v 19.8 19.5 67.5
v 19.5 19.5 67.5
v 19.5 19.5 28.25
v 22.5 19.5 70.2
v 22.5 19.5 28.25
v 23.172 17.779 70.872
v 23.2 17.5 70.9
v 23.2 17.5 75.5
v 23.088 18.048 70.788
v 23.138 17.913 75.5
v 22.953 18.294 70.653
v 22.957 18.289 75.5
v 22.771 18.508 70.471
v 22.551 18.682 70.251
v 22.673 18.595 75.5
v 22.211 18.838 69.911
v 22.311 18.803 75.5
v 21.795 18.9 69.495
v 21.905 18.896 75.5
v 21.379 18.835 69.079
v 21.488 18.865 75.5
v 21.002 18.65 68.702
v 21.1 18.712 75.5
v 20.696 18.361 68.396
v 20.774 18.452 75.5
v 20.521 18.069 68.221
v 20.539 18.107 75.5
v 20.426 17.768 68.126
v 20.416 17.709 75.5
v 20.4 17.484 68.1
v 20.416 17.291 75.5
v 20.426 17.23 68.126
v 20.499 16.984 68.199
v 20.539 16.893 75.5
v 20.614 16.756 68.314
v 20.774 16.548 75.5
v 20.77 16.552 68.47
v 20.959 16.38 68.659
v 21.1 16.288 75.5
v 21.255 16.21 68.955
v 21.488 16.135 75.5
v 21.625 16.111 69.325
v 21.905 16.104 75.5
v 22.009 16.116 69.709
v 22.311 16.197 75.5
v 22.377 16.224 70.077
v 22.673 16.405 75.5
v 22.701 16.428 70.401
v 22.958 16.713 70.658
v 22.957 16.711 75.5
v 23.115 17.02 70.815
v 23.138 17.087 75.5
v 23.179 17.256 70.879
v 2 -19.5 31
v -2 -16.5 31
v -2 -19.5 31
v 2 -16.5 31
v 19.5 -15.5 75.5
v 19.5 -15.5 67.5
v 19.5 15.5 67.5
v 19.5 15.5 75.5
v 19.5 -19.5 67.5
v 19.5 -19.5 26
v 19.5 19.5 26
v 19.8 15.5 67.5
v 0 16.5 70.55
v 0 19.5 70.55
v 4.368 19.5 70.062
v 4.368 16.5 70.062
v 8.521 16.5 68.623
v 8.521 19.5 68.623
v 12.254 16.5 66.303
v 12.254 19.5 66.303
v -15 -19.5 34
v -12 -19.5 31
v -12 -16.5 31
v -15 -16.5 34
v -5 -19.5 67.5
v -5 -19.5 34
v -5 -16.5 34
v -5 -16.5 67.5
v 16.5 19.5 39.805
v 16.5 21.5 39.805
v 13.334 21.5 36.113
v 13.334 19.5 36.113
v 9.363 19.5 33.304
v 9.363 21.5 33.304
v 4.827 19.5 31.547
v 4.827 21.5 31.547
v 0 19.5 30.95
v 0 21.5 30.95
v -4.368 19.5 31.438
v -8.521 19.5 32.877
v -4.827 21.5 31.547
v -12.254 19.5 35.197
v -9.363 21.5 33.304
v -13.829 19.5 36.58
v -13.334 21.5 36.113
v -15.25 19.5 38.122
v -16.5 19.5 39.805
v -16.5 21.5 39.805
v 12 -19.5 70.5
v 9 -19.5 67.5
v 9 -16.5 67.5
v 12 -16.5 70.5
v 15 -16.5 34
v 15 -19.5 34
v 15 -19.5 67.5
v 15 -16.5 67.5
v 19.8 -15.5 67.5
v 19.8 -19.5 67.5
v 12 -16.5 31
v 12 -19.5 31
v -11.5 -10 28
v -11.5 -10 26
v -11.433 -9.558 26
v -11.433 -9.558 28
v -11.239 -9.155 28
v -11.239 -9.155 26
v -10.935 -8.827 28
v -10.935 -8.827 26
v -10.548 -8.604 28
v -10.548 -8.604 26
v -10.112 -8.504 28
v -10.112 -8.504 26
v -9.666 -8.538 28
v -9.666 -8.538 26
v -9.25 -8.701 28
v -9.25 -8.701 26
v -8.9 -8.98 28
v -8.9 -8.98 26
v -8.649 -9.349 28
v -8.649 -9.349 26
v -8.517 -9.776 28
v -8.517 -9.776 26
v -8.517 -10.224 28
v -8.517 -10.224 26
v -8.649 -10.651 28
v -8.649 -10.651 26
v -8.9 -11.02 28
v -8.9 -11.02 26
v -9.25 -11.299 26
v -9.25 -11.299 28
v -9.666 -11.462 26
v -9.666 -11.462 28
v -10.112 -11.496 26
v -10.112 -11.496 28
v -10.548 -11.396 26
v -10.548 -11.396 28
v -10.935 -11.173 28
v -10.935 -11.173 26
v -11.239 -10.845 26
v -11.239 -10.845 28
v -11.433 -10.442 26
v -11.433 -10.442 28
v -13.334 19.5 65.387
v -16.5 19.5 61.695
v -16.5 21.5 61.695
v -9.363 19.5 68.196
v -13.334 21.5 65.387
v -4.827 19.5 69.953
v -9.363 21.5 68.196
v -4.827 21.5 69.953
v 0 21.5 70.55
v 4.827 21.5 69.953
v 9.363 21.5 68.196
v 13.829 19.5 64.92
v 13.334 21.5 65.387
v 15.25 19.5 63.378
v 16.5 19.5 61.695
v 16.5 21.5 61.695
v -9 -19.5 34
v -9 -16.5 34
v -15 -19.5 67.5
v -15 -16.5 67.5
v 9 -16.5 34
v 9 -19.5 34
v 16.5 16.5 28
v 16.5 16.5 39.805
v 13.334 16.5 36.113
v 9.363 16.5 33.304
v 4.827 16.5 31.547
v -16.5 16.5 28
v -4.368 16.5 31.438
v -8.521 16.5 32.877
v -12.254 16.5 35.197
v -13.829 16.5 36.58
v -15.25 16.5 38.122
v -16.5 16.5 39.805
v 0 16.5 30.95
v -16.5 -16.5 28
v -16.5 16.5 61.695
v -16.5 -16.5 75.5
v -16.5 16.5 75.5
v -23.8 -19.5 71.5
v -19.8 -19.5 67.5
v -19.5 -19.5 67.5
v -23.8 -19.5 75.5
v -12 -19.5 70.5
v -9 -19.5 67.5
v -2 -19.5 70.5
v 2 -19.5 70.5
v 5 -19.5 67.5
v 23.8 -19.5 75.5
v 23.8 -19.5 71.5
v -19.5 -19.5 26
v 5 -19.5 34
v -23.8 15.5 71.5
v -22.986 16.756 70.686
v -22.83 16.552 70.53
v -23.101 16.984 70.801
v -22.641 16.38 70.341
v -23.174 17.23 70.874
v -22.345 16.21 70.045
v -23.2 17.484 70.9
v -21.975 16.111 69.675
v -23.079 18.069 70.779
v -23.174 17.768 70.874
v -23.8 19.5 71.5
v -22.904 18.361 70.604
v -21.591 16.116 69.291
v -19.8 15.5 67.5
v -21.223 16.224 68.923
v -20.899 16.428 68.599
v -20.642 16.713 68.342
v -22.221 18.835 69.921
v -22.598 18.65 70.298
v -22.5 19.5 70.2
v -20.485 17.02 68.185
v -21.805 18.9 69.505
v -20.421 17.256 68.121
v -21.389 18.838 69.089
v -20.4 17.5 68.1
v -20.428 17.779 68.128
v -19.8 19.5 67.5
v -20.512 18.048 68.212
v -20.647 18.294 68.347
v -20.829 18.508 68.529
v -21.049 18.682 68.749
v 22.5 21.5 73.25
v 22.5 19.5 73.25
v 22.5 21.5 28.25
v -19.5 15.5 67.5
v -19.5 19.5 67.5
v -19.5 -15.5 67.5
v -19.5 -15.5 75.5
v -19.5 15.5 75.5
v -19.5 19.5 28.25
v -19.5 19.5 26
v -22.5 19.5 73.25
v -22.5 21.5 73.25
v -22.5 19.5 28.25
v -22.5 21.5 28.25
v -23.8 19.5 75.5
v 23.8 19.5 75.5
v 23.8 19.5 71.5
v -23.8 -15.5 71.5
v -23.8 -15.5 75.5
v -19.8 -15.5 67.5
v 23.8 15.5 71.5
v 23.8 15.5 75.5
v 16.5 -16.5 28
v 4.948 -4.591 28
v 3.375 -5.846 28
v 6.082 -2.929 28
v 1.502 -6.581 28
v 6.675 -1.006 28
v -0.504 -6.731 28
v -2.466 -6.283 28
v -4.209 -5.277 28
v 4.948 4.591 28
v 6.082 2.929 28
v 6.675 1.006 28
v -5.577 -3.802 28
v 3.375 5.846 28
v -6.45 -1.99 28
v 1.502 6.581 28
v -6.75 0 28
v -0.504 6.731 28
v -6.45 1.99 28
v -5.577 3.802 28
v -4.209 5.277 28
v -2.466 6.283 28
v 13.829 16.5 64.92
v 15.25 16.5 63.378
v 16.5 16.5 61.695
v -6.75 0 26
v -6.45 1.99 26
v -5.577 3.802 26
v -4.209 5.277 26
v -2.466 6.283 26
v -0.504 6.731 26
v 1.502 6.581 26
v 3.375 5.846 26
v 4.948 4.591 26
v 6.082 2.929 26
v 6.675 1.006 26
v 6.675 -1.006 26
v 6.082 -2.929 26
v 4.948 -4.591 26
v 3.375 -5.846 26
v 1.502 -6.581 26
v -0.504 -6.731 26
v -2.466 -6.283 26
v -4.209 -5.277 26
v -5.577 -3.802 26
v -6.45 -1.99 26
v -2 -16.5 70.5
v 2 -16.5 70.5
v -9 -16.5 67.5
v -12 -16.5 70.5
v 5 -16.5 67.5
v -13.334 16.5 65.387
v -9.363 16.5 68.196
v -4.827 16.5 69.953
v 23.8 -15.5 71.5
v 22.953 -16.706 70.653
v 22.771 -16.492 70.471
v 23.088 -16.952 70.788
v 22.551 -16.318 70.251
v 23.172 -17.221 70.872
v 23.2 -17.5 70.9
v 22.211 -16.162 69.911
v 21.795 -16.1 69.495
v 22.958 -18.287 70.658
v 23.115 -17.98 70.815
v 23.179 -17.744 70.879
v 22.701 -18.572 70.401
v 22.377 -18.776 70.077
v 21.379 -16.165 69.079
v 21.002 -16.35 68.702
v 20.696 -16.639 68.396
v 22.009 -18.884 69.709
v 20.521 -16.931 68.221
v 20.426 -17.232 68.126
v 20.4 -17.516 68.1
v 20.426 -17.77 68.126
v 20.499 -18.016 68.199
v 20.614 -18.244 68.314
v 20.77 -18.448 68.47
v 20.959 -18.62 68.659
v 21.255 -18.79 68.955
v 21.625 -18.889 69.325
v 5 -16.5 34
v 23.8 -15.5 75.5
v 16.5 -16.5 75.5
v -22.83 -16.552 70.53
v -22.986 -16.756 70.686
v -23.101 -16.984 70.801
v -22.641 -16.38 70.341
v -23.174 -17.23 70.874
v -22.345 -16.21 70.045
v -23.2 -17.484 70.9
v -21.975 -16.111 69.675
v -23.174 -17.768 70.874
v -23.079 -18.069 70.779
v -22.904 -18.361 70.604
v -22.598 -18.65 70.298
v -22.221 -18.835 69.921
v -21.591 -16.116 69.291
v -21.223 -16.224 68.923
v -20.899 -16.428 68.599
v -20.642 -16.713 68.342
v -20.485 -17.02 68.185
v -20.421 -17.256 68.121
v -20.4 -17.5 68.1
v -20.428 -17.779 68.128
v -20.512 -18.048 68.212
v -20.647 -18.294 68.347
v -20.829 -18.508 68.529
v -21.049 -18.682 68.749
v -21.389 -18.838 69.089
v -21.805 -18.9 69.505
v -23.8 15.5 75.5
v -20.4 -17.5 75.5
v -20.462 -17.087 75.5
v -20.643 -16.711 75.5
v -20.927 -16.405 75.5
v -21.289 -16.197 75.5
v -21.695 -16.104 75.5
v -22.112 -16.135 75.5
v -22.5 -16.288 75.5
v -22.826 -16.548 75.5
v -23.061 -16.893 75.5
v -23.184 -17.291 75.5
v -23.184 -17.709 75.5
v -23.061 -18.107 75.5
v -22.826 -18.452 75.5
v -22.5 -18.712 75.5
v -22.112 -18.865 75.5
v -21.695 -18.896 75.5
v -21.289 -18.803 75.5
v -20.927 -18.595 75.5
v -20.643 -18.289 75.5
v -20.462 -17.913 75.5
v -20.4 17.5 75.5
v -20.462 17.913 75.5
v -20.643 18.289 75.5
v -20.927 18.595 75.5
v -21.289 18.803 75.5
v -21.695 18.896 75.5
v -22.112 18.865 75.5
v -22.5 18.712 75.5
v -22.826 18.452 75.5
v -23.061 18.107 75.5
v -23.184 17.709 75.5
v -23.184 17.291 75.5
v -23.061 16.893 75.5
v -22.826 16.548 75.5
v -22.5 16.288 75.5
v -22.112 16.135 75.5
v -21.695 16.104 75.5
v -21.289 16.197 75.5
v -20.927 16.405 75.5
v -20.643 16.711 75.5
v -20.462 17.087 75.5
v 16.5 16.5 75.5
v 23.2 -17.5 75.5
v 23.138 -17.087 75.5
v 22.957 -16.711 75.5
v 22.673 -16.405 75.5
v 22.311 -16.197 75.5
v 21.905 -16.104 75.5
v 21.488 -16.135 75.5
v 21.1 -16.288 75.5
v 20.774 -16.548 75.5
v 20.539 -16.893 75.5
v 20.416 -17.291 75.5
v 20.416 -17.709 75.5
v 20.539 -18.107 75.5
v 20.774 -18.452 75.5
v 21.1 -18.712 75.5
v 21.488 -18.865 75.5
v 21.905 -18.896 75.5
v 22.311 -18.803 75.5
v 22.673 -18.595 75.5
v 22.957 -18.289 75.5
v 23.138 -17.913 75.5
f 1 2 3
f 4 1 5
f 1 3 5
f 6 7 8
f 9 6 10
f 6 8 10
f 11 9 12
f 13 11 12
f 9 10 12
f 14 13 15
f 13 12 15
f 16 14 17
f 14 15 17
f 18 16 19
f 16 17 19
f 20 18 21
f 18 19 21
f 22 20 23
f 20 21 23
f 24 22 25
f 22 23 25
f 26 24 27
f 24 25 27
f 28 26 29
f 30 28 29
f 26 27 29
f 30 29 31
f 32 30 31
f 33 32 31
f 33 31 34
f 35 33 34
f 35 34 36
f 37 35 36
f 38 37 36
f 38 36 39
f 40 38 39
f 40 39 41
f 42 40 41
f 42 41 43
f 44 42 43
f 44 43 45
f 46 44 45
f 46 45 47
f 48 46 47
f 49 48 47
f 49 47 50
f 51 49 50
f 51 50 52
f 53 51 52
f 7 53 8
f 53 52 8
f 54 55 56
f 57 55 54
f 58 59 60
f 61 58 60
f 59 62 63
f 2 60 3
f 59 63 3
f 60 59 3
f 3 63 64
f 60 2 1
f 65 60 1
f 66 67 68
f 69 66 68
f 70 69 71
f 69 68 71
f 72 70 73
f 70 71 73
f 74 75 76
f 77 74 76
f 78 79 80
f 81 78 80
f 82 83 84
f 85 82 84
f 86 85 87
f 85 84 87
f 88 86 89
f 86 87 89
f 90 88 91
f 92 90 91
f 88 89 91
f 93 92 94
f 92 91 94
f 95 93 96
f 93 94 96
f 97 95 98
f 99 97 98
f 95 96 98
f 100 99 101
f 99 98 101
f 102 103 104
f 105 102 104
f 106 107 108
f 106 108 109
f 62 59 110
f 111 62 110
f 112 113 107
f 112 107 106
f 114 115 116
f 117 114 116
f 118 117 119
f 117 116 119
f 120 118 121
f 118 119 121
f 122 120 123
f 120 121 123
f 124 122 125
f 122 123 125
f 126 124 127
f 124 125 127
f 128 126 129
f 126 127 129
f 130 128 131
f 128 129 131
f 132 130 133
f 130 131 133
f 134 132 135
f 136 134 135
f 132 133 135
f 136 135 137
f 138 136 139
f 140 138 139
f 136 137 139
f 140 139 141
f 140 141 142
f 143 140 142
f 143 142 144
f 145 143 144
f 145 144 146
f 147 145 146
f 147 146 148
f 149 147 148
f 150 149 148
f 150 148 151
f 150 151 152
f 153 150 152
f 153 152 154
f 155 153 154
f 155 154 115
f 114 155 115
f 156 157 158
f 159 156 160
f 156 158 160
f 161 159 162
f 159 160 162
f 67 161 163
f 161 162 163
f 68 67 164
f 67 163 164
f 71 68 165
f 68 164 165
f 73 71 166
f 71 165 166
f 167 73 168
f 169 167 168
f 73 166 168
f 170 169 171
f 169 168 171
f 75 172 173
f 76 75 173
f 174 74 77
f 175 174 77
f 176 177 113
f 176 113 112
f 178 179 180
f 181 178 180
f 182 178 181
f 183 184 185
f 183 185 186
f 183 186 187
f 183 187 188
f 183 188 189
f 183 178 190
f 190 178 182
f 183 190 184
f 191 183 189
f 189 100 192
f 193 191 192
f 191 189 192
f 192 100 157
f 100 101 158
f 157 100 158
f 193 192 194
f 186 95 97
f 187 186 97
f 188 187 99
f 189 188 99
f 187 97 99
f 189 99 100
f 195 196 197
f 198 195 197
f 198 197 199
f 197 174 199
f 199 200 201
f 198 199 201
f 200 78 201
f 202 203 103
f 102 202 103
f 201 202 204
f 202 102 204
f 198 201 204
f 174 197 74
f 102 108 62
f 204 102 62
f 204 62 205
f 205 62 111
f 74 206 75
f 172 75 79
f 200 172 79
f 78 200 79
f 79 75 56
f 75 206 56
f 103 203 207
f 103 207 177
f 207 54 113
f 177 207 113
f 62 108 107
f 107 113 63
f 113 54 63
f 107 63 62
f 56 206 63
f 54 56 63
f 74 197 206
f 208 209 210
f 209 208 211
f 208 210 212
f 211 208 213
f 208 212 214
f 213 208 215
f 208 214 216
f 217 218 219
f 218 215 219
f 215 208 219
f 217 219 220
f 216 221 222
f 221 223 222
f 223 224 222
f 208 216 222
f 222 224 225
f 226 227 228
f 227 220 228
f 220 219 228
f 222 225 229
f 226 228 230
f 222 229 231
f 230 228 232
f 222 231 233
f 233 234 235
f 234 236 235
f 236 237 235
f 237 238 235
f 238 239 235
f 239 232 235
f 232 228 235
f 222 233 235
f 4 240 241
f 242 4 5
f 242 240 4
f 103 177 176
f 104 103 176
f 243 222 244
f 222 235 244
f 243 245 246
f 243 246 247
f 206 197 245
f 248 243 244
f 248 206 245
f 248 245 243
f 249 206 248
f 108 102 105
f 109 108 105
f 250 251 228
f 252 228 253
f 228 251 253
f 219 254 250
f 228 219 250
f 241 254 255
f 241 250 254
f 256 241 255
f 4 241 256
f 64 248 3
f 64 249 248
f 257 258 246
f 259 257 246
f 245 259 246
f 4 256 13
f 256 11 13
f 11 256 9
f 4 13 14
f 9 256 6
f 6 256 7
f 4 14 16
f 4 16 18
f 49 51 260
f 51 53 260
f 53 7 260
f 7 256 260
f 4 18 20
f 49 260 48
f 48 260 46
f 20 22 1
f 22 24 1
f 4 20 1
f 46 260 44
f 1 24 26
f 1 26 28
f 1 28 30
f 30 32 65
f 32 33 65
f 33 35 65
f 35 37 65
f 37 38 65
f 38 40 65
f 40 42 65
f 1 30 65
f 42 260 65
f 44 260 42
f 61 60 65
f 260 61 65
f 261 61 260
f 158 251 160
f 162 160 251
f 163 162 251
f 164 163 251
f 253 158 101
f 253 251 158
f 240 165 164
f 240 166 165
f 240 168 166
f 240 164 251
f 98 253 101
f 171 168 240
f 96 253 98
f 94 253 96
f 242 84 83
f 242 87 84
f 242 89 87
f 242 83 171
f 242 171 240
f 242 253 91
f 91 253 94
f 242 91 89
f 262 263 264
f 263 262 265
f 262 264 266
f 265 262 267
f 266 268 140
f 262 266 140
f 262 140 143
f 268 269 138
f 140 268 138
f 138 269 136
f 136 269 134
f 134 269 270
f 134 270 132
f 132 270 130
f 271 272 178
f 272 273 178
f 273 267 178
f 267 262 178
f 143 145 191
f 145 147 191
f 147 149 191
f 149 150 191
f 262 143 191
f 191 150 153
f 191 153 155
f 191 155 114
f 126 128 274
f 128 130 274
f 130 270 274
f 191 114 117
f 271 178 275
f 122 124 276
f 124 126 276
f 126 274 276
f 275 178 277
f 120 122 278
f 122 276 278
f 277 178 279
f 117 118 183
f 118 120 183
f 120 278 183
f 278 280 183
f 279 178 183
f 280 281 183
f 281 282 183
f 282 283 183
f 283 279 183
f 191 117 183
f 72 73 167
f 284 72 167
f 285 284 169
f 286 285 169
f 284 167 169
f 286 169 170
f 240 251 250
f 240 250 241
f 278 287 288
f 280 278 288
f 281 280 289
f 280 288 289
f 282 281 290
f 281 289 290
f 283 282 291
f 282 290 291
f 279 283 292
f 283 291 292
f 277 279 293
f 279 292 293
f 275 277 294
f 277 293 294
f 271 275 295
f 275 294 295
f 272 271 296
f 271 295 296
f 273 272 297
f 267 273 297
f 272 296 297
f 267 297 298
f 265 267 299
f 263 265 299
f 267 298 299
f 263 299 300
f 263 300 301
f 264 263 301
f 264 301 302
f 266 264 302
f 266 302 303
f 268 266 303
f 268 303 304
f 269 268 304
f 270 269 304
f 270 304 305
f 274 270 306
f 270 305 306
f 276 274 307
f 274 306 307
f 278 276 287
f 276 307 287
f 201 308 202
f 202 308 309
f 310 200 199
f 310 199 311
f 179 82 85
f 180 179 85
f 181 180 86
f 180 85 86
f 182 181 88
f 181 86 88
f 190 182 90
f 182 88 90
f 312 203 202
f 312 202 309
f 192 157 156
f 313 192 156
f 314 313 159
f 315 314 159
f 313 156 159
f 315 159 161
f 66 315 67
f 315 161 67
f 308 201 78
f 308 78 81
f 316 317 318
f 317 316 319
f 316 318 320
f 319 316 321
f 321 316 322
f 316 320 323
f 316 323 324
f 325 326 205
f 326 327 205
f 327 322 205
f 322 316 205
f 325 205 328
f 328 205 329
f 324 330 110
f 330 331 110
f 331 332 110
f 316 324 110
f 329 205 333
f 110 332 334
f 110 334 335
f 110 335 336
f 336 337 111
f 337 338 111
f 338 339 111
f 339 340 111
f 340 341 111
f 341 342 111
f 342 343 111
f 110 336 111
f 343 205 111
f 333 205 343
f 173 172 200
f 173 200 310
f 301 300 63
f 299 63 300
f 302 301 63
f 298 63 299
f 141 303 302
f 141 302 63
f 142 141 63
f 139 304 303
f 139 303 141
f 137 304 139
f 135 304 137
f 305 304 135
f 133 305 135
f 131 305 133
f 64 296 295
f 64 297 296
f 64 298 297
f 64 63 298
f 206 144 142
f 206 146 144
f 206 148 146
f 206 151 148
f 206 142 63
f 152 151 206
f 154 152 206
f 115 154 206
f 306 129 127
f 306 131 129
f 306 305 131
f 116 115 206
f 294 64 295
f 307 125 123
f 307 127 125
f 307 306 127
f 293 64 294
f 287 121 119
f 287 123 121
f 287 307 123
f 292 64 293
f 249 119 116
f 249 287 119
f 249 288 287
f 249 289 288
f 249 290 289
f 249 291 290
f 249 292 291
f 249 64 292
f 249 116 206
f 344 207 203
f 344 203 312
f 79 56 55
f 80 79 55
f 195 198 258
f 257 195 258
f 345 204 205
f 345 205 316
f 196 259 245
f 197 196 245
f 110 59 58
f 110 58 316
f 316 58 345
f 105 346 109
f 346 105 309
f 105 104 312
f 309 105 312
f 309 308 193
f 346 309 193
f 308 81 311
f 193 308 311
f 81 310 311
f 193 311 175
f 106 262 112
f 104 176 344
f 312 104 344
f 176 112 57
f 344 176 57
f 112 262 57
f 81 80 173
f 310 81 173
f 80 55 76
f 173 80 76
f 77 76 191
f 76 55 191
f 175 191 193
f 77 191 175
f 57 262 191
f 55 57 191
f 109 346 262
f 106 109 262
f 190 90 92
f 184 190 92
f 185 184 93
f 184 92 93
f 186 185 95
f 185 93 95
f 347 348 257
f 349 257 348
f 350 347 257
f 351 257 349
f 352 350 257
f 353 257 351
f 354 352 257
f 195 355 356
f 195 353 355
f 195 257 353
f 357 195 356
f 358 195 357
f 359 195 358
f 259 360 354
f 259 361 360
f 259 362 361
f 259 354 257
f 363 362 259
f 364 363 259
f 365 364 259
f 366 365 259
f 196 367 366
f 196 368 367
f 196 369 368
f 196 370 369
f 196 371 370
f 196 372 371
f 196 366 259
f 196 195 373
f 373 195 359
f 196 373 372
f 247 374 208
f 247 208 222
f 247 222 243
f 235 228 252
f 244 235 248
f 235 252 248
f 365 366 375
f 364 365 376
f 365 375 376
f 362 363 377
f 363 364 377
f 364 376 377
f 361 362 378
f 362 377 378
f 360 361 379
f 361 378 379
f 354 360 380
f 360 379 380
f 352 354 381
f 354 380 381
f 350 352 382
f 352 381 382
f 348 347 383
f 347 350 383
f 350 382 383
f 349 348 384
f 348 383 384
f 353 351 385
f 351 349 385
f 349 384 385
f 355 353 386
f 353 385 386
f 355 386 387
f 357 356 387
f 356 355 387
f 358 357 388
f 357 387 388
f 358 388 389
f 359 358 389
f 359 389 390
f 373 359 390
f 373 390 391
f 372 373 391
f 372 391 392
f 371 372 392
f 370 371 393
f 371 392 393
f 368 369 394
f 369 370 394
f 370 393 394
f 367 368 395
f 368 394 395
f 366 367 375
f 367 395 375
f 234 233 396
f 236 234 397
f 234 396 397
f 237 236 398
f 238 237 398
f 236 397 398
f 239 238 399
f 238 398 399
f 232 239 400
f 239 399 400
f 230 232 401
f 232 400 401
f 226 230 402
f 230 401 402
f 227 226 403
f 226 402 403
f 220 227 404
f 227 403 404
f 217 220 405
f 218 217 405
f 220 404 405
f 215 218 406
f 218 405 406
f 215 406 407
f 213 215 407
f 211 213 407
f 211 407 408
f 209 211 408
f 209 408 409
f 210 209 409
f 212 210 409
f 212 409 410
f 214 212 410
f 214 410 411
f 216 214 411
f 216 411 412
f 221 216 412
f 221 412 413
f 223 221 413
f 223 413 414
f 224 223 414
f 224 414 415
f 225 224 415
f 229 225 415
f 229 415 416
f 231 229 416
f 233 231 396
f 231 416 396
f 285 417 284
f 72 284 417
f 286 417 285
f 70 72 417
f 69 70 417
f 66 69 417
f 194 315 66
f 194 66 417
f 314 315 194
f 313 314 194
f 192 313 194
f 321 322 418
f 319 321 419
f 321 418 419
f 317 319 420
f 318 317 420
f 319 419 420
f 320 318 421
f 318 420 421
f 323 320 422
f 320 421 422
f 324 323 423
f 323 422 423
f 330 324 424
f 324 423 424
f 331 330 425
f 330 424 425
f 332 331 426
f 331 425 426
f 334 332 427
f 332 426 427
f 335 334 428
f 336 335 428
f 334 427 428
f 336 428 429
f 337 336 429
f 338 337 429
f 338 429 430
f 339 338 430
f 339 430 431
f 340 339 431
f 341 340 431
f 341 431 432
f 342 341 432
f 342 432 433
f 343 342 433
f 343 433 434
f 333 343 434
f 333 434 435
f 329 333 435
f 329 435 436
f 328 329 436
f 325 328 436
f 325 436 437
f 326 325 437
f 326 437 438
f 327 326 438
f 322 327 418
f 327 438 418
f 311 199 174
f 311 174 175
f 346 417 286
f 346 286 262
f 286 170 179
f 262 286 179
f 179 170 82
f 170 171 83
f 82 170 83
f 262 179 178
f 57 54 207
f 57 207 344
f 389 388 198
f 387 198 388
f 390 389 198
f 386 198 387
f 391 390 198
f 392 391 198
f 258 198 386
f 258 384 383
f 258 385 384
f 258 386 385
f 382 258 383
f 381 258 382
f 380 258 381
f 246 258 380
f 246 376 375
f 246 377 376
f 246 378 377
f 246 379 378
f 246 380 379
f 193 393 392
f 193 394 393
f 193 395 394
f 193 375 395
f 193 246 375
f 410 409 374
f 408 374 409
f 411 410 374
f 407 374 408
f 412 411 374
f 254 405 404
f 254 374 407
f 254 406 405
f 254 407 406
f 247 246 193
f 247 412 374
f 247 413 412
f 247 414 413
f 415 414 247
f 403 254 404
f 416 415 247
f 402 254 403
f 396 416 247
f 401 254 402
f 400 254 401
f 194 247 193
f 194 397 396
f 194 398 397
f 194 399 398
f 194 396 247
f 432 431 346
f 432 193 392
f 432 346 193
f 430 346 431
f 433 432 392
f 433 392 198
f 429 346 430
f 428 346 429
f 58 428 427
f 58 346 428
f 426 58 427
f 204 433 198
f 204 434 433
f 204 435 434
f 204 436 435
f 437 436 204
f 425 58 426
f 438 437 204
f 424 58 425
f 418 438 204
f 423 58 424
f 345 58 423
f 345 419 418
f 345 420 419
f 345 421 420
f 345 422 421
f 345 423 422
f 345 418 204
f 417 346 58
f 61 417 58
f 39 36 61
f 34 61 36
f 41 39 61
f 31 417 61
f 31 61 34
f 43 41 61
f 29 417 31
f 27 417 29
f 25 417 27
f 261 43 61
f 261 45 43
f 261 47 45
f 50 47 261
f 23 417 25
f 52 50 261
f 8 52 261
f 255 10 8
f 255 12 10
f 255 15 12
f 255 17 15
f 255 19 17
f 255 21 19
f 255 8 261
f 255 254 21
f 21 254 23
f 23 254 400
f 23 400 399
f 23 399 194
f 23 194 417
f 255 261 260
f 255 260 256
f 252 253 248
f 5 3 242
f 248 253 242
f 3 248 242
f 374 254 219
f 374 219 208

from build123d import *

# Parameters (mm, degrees)
CROQUIS1_W               = 39
CROQUIS1_H               = 39
SALIENTE_EXTRUIR2_DEPTH  = 75.5
CROQUIS2_W               = 33
CROQUIS2_H               = 33
CORTAR_EXTRUIR1_DEPTH    = 80
CROQUIS11_W              = 33
CROQUIS11_H              = 33
SALIENTE_EXTRUIR3_DEPTH  = 37
CROQUIS13_W              = 33
CROQUIS13_H              = 33
CORTAR_EXTRUIR6_DEPTH    = 81.378790735
CROQUIS16_W              = 39
CROQUIS16_H              = 39
CORTAR_EXTRUIR8_DEPTH    = 10
CROQUIS19_W              = 20
CROQUIS19_H              = 20
SALIENTE_EXTRUIR4_DEPTH  = 3
CROQUIS33_W              = 39
CROQUIS33_H              = 39
SALIENTE_EXTRUIR7_DEPTH  = 18
CROQUIS35_W              = 39
CROQUIS35_H              = 39
CORTAR_EXTRUIR17_DEPTH   = 16
CROQUIS36_R              = 6.75
CORTAR_EXTRUIR18_DEPTH   = 2
CORTAR_EXTRUIR19_REACH   = 89.187
SALIENTE_EXTRUIR10_START = 2
CROQUIS38_W              = 45
CROQUIS38_H              = 45
SALIENTE_EXTRUIR10_DEPTH = 2
CROQUIS39_W              = 7.3
CROQUIS39_H              = 4
SALIENTE_EXTRUIR12_DEPTH = 8
RESPIRADERO1_START       = 31
RESPIRADERO1_OUTLINE_W   = 6
RESPIRADERO1_OUTLINE_H   = 3
RESPIRADERO1_OUTLINE_W_2 = 10
RESPIRADERO1_DEPTH       = 39.5
CHAFL_N7_SIZE            = 3
CROQUIS40_R              = 1.4
CORTAR_EXTRUIR20_DEPTH   = 10
CHAFL_N8_SIZE            = 4
CORTAR_EXTRUIR21_REACH   = 60.983
CROQUIS43_R              = 1.5


# Read off the part's stored shape, not the designer's step: Respiradero1
# Some blends are built 0.0001 mm under size
with BuildPart() as part:
    # Croquis1 → Saliente-Extruir2 (new body)
    with BuildSketch(Plane.XY):
        Rectangle(CROQUIS1_W, CROQUIS1_H)
    extrude(amount=SALIENTE_EXTRUIR2_DEPTH)

    # Croquis2 → Cortar-Extruir1 (cut)
    with BuildSketch(Plane.XY.offset(75.5)):
        Rectangle(CROQUIS2_W, CROQUIS2_H)
    extrude(amount=-CORTAR_EXTRUIR1_DEPTH, mode=Mode.SUBTRACT)

    # Croquis11 → Saliente-Extruir3 (add)
    with BuildSketch(Plane(origin=(0, 0, 0), x_dir=(-1, 0, 0), z_dir=(0, 0, -1))):
        Rectangle(CROQUIS11_W, CROQUIS11_H)
    extrude(amount=-SALIENTE_EXTRUIR3_DEPTH)

    # Croquis13 → Cortar-Extruir6 (cut, through all)
    with BuildSketch(Plane(origin=(0, 0, 0), x_dir=(-1, 0, 0), z_dir=(0, 0, -1))):
        Rectangle(CROQUIS13_W, CROQUIS13_H)
    extrude(amount=-CORTAR_EXTRUIR6_DEPTH, mode=Mode.SUBTRACT)

    # Croquis16 → Cortar-Extruir8 (cut)
    with BuildSketch(Plane(origin=(0, 0, 0), x_dir=(-1, 0, 0), z_dir=(0, 0, -1))):
        Rectangle(CROQUIS16_W, CROQUIS16_H)
    extrude(amount=-CORTAR_EXTRUIR8_DEPTH, mode=Mode.SUBTRACT)

    # Croquis19 → Saliente-Extruir4 (add)
    with BuildSketch(Plane(origin=(0, 19.5, 0), x_dir=(1, 0, 0), z_dir=(0, 1, 0))):
        with Locations((-2, -55.5)):
            Rectangle(CROQUIS19_W, CROQUIS19_H)
    extrude(amount=-SALIENTE_EXTRUIR4_DEPTH)

    # Croquis33 → Saliente-Extruir7 (add)
    with BuildSketch(Plane(origin=(0, 0, 10), x_dir=(-1, 0, 0), z_dir=(0, 0, -1))):
        Rectangle(CROQUIS33_W, CROQUIS33_H)
    extrude(amount=-SALIENTE_EXTRUIR7_DEPTH)

    # Croquis35 → Cortar-Extruir17 (cut)
    with BuildSketch(Plane(origin=(0, 0, 10), x_dir=(-1, 0, 0), z_dir=(0, 0, -1))):
        Rectangle(CROQUIS35_W, CROQUIS35_H)
    extrude(amount=-CORTAR_EXTRUIR17_DEPTH, mode=Mode.SUBTRACT)

    # Croquis36 → Cortar-Extruir18 (cut)
    with BuildSketch(Plane(origin=(0, 0, 26), x_dir=(-1, 0, 0), z_dir=(0, 0, -1))):
        Circle(CROQUIS36_R)
    extrude(amount=-CORTAR_EXTRUIR18_DEPTH, mode=Mode.SUBTRACT)

    # Croquis37 → Cortar-Extruir19 (cut, up to next)
    with BuildSketch(Plane(origin=(0, 19.5, 0), x_dir=(1, 0, 0), z_dir=(0, 1, 0)), mode=Mode.PRIVATE) as cortar_extruir19_sk1:
        with BuildLine():
            ThreePointArc((-5.8e-08, -30.95), (-6.484436966, -32.041924812), (-12.253670087, -35.19726489))
            Line((-12.253670087, -35.19726489), (12.253670087, -66.30273511))
            ThreePointArc((12.253670087, -66.30273511), (14.560271631, -64.167842228), (16.5, -61.694861808))
            Line((16.5, -61.694861808), (16.5, -39.805138192))
            ThreePointArc((16.5, -39.805138192), (9.363005266, -33.303678543), (-5.8e-08, -30.95))
        make_face()
    cortar_extruir19_tool1 = extrude(cortar_extruir19_sk1.sketch, amount=-CORTAR_EXTRUIR19_REACH, mode=Mode.PRIVATE) & part.part
    # Croquis37 → Cortar-Extruir19 (cut, up to next)
    with BuildSketch(Plane(origin=(0, 19.5, 0), x_dir=(1, 0, 0), z_dir=(0, 1, 0)), mode=Mode.PRIVATE) as cortar_extruir19_sk2:
        with BuildLine():
            Line((12.253670087, -66.30273511), (-12.253670087, -35.19726489))
            ThreePointArc((-12.253670087, -35.19726489), (-14.560271631, -37.332157772), (-16.5, -39.805138192))
            Line((-16.5, -39.805138192), (-16.5, -61.694861808))
            ThreePointArc((-16.5, -61.694861808), (-9.363005292, -68.196321443), (0, -70.55))
            ThreePointArc((0, -70.55), (6.484436939, -69.458075197), (12.253670087, -66.30273511))
        make_face()
    cortar_extruir19_tool2 = extrude(cortar_extruir19_sk2.sketch, amount=-CORTAR_EXTRUIR19_REACH, mode=Mode.PRIVATE) & part.part
    add(cortar_extruir19_tool1.solids().sort_by_distance((5.629579, 19.5, 45.099579))[0], mode=Mode.SUBTRACT)
    add(cortar_extruir19_tool2.solids().sort_by_distance((-5.629579, 19.5, 56.400421))[0], mode=Mode.SUBTRACT)

    # Croquis38 → Saliente-Extruir10 (add)
    with BuildSketch(Plane(origin=(0, 19.5, 0), x_dir=(1, 0, 0), z_dir=(0, 1, 0)).offset(SALIENTE_EXTRUIR10_START)):
        with Locations((0, -50.75)):
            Rectangle(CROQUIS38_W, CROQUIS38_H)
        with BuildLine():
            Line((-16.5, -39.805138192), (-16.5, -61.694861808))
            ThreePointArc((-16.5, -61.694861808), (0, -70.55), (16.5, -61.694861808))
            Line((16.5, -61.694861808), (16.5, -39.805138192))
            ThreePointArc((16.5, -39.805138192), (0, -30.95), (-16.5, -39.805138192))
        make_face(mode=Mode.SUBTRACT)
    extrude(amount=-SALIENTE_EXTRUIR10_DEPTH)

    # Croquis39 → Saliente-Extruir12 (add)
    with BuildSketch(Plane.XY.offset(75.5)):
        Polygon((-16.5, 16.5), (-16.5, 19.5), (-23.8, 19.5), (-23.8, 15.5), (-16.5, 15.5), align=None)
        with Locations((-20.15, -17.5)):
            Rectangle(CROQUIS39_W, CROQUIS39_H)
        with Locations((20.15, -17.5)):
            Rectangle(CROQUIS39_W, CROQUIS39_H)
        with Locations((20.15, 17.5)):
            Rectangle(CROQUIS39_W, CROQUIS39_H)
    extrude(amount=-SALIENTE_EXTRUIR12_DEPTH)

    # Respiradero1 outline → Respiradero1 (cut)
    with BuildSketch(Plane.XY.offset(RESPIRADERO1_START)):
        with Locations((-12, -18)):
            Rectangle(RESPIRADERO1_OUTLINE_W, RESPIRADERO1_OUTLINE_H)
        with Locations((0, -18)):
            Rectangle(RESPIRADERO1_OUTLINE_W_2, RESPIRADERO1_OUTLINE_H)
        with Locations((12, -18)):
            Rectangle(RESPIRADERO1_OUTLINE_W, RESPIRADERO1_OUTLINE_H)
    extrude(amount=RESPIRADERO1_DEPTH, mode=Mode.SUBTRACT)

    # Chaflán7
    chafl_n7_edges = [part.edges().sort_by_distance(p)[0] for p in [
        (15, -18, 70.5),
        (-15, -18, 70.5),
        (-15, -18, 31),
        (15, -18, 31),
        (5, -18, 31),
        (5, -18, 70.5),
        (9, -18, 70.5),
        (9, -18, 31),
        (-5, -18, 70.5),
        (-5, -18, 31),
        (-9, -18, 31),
        (-9, -18, 70.5),
    ]]
    chamfer(chafl_n7_edges, length=CHAFL_N7_SIZE - 0.0001)  # a hair under: the kernel refuses the full size

    # Croquis40 → Cortar-Extruir20 (cut)
    with BuildSketch(Plane.XY.offset(75.5)):
        with Locations((-21.8, 17.5)):
            Circle(CROQUIS40_R)
        with Locations((21.8, 17.5)):
            Circle(CROQUIS40_R)
        with Locations((21.8, -17.5)):
            Circle(CROQUIS40_R)
        with Locations((-21.8, -17.5)):
            Circle(CROQUIS40_R)
    extrude(amount=-CORTAR_EXTRUIR20_DEPTH, mode=Mode.SUBTRACT)

    # Chaflán8
    # the kernel refuses this chamfer: 4 mm, written as the material it takes off along each edge
    with BuildSketch(Plane(origin=(-23.8, 19.5, 67.5), x_dir=(-0.02749587661058651, 0, 0.9996219169112968), z_dir=(0, -1, 0)), Plane(origin=(23.8, 5.213268048, 67.5), x_dir=(0.02749587661058651, 0, 0.9996219169112968), z_dir=(0, 1, 0))) as chafl_n8_piece_1:
        Polygon((CHAFL_N8_SIZE * 0.999621916911, -CHAFL_N8_SIZE * 0.0274958766106), (-CHAFL_N8_SIZE * 0.0274958766106, -CHAFL_N8_SIZE * 0.999621916911), (0, 0), align=None)
    extrude(amount=14.286731952, mode=Mode.SUBTRACT)
    with BuildSketch(Plane(origin=(-23.8, -29.786731952, 67.5), x_dir=(-0.02749587661058651, 0, 0.9996219169112968), z_dir=(0, 1, 0))) as chafl_n8_piece_2:
        Polygon((CHAFL_N8_SIZE * 0.999621916911, CHAFL_N8_SIZE * 0.0274958766106), (-CHAFL_N8_SIZE * 0.0274958766106, CHAFL_N8_SIZE * 0.999621916911), (0, 0), align=None)
    extrude(amount=24.573463904, mode=Mode.SUBTRACT)
    with BuildSketch(Plane(origin=(23.8, -29.786731952, 67.5), x_dir=(0.02749587661058651, 0, 0.9996219169112968), z_dir=(0, 1, 0))) as chafl_n8_piece_3:
        Polygon((CHAFL_N8_SIZE * 0.999621916911, -CHAFL_N8_SIZE * 0.0274958766106), (-CHAFL_N8_SIZE * 0.0274958766106, -CHAFL_N8_SIZE * 0.999621916911), (0, 0), align=None)
    extrude(amount=24.573463904, mode=Mode.SUBTRACT)

    # Croquis43 → Cortar-Extruir21 (cut, up to next)
    with BuildSketch(Plane(origin=(0, 0, 26), x_dir=(-1, 0, 0), z_dir=(0, 0, -1)), mode=Mode.PRIVATE) as cortar_extruir21_sk1:
        with Locations((10, -10)):
            Circle(CROQUIS43_R)
    cortar_extruir21_tool1 = extrude(cortar_extruir21_sk1.sketch, amount=-CORTAR_EXTRUIR21_REACH, mode=Mode.PRIVATE) & part.part
    add(cortar_extruir21_tool1.solids().sort_by_distance((-10, -10, 26))[0], mode=Mode.SUBTRACT)


solid = part.part
